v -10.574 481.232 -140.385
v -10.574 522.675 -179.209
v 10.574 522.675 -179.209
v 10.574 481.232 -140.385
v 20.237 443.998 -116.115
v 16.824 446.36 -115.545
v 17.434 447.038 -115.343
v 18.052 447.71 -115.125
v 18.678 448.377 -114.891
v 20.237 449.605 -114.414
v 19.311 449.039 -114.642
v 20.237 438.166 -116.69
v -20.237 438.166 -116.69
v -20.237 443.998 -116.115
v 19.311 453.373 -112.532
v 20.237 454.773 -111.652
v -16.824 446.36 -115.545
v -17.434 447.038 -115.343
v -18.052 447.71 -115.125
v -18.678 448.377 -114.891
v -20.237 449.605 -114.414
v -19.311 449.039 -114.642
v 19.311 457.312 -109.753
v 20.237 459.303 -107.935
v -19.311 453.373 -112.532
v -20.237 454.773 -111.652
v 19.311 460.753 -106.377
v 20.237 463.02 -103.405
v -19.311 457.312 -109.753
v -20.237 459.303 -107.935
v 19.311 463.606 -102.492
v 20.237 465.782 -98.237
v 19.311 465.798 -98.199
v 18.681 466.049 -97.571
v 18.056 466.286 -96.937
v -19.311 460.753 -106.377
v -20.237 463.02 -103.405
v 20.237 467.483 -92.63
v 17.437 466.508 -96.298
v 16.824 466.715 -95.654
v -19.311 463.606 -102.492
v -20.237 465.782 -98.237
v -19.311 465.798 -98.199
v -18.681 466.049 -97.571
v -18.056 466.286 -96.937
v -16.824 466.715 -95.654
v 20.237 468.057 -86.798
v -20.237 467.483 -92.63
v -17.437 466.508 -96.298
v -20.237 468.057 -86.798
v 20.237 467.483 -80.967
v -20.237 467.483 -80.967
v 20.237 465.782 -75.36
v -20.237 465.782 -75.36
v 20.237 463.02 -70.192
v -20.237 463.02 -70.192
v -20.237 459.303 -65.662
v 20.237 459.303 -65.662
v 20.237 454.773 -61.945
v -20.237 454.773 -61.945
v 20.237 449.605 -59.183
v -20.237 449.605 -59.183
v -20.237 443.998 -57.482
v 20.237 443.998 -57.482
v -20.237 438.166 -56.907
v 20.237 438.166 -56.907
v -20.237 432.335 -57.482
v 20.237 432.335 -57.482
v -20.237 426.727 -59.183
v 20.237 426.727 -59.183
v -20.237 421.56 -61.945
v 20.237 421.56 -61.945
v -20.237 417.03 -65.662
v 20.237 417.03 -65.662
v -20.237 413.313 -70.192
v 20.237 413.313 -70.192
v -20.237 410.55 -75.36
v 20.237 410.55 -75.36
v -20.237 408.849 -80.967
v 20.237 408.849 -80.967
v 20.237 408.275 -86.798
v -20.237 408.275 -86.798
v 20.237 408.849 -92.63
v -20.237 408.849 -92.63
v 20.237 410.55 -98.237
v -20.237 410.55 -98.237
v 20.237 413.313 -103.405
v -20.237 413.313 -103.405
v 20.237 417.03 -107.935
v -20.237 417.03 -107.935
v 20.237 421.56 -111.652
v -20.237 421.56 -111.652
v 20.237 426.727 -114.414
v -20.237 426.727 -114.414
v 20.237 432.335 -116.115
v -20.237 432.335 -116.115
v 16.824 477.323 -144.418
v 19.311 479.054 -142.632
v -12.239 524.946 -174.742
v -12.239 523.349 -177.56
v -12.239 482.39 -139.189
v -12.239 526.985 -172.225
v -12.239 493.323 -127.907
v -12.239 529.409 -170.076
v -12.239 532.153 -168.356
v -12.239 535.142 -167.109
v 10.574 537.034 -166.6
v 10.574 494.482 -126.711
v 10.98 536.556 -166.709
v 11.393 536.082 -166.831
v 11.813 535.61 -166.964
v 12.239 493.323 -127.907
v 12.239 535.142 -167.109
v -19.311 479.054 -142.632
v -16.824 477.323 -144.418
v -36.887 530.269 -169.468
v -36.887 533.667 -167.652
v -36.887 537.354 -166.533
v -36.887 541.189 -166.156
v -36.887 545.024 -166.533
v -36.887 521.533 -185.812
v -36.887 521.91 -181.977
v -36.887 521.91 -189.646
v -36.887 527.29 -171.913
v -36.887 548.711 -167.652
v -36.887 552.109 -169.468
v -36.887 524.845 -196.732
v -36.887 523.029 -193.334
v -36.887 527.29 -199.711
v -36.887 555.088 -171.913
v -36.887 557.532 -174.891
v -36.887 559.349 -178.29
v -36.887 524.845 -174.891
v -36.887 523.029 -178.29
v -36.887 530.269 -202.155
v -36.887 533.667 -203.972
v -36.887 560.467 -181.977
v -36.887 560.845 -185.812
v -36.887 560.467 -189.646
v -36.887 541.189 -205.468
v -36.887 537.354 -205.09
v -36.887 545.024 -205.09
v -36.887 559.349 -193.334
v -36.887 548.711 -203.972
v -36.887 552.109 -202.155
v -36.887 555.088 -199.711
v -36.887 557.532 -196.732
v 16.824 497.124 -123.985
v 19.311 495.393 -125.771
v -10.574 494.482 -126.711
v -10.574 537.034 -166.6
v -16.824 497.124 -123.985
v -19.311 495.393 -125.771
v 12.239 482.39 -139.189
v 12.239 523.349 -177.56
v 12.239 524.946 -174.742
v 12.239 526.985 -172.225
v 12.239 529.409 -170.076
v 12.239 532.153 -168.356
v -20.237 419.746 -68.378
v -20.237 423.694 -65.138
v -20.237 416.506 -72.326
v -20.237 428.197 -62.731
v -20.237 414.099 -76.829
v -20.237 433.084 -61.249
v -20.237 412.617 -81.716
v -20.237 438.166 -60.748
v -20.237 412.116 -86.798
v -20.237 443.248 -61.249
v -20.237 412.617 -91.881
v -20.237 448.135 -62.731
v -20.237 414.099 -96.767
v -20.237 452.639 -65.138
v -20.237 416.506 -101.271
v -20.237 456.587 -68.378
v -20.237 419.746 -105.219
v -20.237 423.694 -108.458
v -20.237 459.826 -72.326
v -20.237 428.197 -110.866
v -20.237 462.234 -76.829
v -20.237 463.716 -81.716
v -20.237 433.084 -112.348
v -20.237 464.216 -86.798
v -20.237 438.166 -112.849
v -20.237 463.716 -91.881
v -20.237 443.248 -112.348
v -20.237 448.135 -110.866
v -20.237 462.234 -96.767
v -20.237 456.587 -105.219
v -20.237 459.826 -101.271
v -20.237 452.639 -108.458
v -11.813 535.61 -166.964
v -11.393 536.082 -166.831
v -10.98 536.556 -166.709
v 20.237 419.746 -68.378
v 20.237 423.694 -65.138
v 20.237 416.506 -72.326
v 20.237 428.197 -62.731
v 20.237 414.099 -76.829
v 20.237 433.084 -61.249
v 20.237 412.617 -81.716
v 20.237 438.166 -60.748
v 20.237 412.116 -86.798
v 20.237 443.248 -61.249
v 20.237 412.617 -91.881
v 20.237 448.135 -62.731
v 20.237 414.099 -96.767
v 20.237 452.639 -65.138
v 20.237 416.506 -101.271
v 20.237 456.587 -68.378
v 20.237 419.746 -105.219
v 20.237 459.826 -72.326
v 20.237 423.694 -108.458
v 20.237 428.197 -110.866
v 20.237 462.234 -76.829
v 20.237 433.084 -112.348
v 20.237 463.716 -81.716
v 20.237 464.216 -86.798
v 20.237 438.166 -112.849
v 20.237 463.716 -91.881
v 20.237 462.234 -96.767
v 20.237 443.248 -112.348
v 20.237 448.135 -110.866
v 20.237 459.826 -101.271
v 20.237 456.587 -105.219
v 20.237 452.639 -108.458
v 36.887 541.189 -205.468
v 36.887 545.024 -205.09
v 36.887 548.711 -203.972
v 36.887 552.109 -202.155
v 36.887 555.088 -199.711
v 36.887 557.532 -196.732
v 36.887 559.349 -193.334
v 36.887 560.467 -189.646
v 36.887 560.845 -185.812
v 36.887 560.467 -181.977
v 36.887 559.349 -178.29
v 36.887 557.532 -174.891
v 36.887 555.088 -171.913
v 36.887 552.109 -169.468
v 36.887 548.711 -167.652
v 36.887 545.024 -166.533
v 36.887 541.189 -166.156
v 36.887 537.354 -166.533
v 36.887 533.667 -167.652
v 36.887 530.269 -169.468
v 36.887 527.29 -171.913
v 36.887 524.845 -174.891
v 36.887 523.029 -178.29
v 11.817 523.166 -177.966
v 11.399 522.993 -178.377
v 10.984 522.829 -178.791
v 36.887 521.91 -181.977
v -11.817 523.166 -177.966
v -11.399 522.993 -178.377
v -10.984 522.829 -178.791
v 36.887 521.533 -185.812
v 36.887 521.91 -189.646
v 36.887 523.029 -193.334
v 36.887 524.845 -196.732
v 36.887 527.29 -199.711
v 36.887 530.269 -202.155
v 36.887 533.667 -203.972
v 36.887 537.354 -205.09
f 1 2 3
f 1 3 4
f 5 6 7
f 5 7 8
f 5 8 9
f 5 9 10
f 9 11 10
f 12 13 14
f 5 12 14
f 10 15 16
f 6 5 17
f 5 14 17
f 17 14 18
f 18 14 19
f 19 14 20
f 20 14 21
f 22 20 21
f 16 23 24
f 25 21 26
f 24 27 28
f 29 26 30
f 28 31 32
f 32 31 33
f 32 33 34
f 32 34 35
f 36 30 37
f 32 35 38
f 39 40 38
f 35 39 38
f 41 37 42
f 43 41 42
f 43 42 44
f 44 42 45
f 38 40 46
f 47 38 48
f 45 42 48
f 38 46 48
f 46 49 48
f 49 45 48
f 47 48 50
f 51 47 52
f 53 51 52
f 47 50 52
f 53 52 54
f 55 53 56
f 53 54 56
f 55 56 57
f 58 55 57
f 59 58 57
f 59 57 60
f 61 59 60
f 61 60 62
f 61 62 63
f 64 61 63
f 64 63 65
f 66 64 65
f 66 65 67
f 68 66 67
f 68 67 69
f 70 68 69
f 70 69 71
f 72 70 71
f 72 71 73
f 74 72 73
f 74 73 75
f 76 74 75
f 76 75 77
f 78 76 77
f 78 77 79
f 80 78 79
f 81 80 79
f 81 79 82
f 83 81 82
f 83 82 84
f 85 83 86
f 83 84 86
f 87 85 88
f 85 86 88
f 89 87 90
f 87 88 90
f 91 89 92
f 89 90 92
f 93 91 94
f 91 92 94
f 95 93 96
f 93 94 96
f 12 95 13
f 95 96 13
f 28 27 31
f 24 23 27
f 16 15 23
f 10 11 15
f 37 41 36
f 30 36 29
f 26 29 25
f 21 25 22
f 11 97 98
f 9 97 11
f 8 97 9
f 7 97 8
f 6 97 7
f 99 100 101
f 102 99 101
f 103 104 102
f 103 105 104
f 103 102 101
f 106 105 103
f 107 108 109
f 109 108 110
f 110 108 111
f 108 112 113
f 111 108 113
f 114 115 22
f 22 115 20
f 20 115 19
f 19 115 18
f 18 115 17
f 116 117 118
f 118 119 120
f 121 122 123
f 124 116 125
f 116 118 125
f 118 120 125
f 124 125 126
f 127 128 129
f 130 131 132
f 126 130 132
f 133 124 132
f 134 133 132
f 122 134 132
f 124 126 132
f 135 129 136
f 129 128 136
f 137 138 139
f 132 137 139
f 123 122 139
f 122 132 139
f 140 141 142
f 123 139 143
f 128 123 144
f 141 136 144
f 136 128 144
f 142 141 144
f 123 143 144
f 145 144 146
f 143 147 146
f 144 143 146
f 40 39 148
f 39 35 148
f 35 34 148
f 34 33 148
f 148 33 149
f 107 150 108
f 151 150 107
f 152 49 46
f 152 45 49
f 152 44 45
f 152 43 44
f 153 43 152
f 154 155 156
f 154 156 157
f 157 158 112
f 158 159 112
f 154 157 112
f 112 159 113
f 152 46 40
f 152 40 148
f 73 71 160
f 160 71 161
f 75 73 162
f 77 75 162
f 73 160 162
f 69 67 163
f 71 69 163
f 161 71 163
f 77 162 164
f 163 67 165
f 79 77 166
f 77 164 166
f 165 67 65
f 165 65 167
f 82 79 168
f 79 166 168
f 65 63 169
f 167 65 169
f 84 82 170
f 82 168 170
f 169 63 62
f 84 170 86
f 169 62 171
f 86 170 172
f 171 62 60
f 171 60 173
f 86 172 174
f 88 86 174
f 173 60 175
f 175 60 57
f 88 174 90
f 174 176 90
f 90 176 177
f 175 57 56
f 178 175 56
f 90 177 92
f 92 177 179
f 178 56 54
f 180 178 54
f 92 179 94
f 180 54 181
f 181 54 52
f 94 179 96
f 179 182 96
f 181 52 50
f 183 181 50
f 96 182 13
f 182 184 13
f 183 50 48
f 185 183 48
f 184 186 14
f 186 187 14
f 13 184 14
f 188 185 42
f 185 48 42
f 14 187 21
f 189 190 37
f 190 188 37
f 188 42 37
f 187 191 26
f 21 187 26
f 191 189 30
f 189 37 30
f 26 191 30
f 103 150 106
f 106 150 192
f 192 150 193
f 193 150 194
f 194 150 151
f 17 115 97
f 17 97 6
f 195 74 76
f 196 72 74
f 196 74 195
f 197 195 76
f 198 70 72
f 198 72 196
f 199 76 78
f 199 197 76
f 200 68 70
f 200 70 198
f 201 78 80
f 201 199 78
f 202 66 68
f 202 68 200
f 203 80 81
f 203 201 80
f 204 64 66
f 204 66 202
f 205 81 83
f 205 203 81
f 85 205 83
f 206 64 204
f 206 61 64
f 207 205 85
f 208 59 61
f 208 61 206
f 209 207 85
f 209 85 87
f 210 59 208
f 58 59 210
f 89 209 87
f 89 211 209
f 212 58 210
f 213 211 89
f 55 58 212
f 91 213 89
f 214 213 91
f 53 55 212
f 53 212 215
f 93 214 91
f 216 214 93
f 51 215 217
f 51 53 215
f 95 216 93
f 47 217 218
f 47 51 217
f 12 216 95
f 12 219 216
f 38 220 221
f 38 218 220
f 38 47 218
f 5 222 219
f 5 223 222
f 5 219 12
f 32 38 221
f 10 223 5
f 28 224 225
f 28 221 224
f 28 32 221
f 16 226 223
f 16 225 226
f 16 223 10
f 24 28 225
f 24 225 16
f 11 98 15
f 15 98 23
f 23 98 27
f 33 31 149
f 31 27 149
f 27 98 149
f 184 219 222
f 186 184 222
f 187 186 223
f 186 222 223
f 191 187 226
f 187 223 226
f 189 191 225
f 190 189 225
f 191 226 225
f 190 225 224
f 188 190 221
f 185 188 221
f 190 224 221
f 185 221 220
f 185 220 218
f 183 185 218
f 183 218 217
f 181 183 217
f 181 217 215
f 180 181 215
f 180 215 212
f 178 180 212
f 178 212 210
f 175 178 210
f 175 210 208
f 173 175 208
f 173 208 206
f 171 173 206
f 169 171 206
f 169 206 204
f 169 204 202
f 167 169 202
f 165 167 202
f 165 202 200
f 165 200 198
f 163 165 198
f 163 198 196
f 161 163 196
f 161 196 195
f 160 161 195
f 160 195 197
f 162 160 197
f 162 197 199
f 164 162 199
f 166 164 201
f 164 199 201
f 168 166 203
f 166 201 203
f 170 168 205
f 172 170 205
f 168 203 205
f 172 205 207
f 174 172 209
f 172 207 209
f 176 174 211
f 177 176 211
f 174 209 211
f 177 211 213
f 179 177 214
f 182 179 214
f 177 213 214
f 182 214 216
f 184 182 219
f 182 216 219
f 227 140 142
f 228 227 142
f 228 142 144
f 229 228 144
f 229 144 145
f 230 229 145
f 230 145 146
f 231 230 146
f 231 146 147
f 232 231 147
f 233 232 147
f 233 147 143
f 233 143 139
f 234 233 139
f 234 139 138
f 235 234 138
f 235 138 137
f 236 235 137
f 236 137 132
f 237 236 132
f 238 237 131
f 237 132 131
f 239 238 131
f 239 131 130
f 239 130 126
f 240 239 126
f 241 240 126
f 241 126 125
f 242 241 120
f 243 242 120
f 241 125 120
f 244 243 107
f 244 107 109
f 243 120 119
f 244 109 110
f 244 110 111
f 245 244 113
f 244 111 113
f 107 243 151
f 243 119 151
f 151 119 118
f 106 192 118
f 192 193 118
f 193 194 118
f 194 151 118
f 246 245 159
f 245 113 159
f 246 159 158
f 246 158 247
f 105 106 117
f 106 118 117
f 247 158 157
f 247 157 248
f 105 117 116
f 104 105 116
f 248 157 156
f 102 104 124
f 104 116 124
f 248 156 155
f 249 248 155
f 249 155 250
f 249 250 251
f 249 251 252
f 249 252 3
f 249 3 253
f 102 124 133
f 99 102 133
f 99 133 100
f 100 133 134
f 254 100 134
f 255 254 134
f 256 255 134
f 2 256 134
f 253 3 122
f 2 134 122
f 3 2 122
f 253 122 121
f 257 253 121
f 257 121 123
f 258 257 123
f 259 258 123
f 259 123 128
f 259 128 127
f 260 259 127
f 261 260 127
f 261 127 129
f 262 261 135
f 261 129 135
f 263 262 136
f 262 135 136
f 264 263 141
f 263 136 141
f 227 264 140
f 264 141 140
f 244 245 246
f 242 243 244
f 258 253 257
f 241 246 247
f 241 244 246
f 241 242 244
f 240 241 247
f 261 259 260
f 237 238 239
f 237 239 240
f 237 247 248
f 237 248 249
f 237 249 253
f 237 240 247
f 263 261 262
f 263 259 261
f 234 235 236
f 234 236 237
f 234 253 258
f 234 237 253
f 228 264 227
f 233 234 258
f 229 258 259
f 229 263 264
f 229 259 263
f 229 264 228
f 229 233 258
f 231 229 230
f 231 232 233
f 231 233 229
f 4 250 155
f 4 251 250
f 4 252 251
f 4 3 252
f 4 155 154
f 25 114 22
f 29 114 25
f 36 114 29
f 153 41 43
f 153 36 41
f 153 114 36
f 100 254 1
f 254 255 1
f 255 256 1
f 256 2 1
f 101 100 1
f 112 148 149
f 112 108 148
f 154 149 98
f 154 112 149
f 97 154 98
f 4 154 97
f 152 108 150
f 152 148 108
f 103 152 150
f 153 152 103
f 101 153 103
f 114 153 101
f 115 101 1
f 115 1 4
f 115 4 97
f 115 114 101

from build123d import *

# Parameters (mm, degrees)
BOSS_EXTRUDE1_DEPTH      = 12.238736
BOSS_EXTRUDE1_DEPTH_BACK = 12.238736
BOSS_EXTRUDE2_DEPTH      = 19.311112
BOSS_EXTRUDE2_DEPTH_BACK = 19.311112
BOSS_EXTRUDE3_DEPTH      = 20.236688
BOSS_EXTRUDE3_DEPTH_BACK = 20.236688
SKETCH3_R                = 29.891166833
BOSS_EXTRUDE4_DEPTH      = 36.886896
BOSS_EXTRUDE4_DEPTH_BACK = 36.886896
SKETCH4_R                = 19.656137362
SKETCH5_R                = 26.05024
CUT_EXTRUDE1_DEPTH       = 601.022741268
CHAMFER1_SIZE            = 1.66497
CHAMFER2_SIZE            = 2.486914


with BuildPart() as part:
    # Sketch1 → Boss-Extrude1 (new, two sides: drawn at the far end of the back side and taken through both)
    with BuildSketch(Plane(origin=(0, 0, 0), x_dir=(0, 0, -1), z_dir=(1, 0, 0)).offset(-BOSS_EXTRUDE1_DEPTH_BACK)):
        Polygon((177.038508, 548.169846), (190.081662, 534.280364), (128.192022, 468.216234), (114.7191, 481.689156), align=None)
    extrude(amount=BOSS_EXTRUDE1_DEPTH + BOSS_EXTRUDE1_DEPTH_BACK)

    # Sketch2 → Boss-Extrude2 (add, two sides: drawn at the far end of the back side and taken through both)
    with BuildSketch(Plane(origin=(0, 0, 0), x_dir=(0, 0, -1), z_dir=(1, 0, 0)).offset(-BOSS_EXTRUDE2_DEPTH_BACK)):
        Polygon((123.984766, 497.124482), (144.41805, 477.32315), (97.590864, 427.107096), (77.789786, 447.540126), align=None)
    extrude(amount=BOSS_EXTRUDE2_DEPTH + BOSS_EXTRUDE2_DEPTH_BACK)

    # Sketch3 → Boss-Extrude3 (add, two sides: drawn at the far end of the back side and taken through both)
    with BuildSketch(Plane(origin=(0, 0, 0), x_dir=(0, 0, -1), z_dir=(1, 0, 0)).offset(-BOSS_EXTRUDE3_DEPTH_BACK)):
        with Locations((86.798404, 438.166256)):
            Circle(SKETCH3_R)
    extrude(amount=BOSS_EXTRUDE3_DEPTH + BOSS_EXTRUDE3_DEPTH_BACK)

    # Sketch4 → Boss-Extrude4 (add, two sides: drawn at the far end of the back side and taken through both)
    with BuildSketch(Plane(origin=(0, 0, 0), x_dir=(0, 0, -1), z_dir=(1, 0, 0)).offset(-BOSS_EXTRUDE4_DEPTH_BACK)):
        with Locations((185.811668, 541.18891)):
            Circle(SKETCH4_R)
    extrude(amount=BOSS_EXTRUDE4_DEPTH + BOSS_EXTRUDE4_DEPTH_BACK)

    # Sketch5 → Cut-Extrude1 (cut, through all)
    with BuildSketch(Plane(origin=(20.236688, 0, 0), x_dir=(0, 0, -1), z_dir=(1, 0, 0))):
        with Locations((86.798404, 438.166256)):
            Circle(SKETCH5_R)
    extrude(amount=-CUT_EXTRUDE1_DEPTH, mode=Mode.SUBTRACT)

    # Chamfer1
    chamfer1_edges = [part.edges().sort_by_distance(p)[0] for p in [
        (12.238736, 501.953153429, -159.79715777),
        (-12.238736, 501.953153429, -159.79715777),
        (12.238736, 515.758092022, -146.655530324),
        (-12.238736, 515.758092022, -146.655530324),
    ]]
    chamfer(chamfer1_edges, length=CHAMFER1_SIZE)

    # Chamfer2
    chamfer2_edges = [part.edges().sort_by_distance(p)[0] for p in [
        (-19.311112, 481.919947716, -109.819549109),
        (19.311112, 481.919947716, -109.819549109),
        (19.311112, 461.841632324, -129.981314135),
        (-19.311112, 461.841632324, -129.981314135),
    ]]
    chamfer(chamfer2_edges, length=CHAMFER2_SIZE)


solid = part.part
